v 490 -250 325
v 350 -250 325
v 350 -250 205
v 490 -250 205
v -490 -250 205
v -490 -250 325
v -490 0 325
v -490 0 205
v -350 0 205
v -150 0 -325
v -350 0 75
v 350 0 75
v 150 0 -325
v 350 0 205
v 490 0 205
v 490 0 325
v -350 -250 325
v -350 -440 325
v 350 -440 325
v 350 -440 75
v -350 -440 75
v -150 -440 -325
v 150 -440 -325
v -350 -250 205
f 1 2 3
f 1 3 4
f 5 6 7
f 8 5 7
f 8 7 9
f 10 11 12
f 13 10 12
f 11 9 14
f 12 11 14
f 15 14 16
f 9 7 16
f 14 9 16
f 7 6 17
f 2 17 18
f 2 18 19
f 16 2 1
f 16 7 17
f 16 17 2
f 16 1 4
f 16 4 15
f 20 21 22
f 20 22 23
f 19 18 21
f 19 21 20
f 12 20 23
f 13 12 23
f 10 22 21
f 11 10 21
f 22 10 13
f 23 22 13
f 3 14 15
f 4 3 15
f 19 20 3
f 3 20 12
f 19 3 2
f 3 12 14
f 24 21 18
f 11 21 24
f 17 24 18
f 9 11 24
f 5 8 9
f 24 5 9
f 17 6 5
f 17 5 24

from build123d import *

# Parameters (mm, degrees)
F0_W     = 700
F0_H     = 650
F1_DEPTH = 440
F3_DEPTH = 440.001
F4_W     = 140
F4_H     = 250
F5_DEPTH = 120


with BuildPart() as f1:
    # F0 (on Front) → F1 (new body)
    with BuildSketch(Plane.XZ):
        Rectangle(F0_W, F0_H)
    extrude(amount=F1_DEPTH)

    # F2 (on face) → F3 (cut, through all)
    with BuildSketch(Plane.XZ.offset(440)):
        Polygon((-150, -325), (-350, 75), (-350, -325), align=None)
        Polygon((350, 75), (150, -325), (350, -325), align=None)
    extrude(amount=-F3_DEPTH, mode=Mode.SUBTRACT)

    # F4 (on face) → F5 (join)
    with BuildSketch(Plane.XY.offset(325)):
        with Locations((420, -125)):
            Rectangle(F4_W, F4_H)
        with Locations((-420, -125)):
            Rectangle(F4_W, F4_H)
    extrude(amount=-F5_DEPTH)


solid = f1.part
